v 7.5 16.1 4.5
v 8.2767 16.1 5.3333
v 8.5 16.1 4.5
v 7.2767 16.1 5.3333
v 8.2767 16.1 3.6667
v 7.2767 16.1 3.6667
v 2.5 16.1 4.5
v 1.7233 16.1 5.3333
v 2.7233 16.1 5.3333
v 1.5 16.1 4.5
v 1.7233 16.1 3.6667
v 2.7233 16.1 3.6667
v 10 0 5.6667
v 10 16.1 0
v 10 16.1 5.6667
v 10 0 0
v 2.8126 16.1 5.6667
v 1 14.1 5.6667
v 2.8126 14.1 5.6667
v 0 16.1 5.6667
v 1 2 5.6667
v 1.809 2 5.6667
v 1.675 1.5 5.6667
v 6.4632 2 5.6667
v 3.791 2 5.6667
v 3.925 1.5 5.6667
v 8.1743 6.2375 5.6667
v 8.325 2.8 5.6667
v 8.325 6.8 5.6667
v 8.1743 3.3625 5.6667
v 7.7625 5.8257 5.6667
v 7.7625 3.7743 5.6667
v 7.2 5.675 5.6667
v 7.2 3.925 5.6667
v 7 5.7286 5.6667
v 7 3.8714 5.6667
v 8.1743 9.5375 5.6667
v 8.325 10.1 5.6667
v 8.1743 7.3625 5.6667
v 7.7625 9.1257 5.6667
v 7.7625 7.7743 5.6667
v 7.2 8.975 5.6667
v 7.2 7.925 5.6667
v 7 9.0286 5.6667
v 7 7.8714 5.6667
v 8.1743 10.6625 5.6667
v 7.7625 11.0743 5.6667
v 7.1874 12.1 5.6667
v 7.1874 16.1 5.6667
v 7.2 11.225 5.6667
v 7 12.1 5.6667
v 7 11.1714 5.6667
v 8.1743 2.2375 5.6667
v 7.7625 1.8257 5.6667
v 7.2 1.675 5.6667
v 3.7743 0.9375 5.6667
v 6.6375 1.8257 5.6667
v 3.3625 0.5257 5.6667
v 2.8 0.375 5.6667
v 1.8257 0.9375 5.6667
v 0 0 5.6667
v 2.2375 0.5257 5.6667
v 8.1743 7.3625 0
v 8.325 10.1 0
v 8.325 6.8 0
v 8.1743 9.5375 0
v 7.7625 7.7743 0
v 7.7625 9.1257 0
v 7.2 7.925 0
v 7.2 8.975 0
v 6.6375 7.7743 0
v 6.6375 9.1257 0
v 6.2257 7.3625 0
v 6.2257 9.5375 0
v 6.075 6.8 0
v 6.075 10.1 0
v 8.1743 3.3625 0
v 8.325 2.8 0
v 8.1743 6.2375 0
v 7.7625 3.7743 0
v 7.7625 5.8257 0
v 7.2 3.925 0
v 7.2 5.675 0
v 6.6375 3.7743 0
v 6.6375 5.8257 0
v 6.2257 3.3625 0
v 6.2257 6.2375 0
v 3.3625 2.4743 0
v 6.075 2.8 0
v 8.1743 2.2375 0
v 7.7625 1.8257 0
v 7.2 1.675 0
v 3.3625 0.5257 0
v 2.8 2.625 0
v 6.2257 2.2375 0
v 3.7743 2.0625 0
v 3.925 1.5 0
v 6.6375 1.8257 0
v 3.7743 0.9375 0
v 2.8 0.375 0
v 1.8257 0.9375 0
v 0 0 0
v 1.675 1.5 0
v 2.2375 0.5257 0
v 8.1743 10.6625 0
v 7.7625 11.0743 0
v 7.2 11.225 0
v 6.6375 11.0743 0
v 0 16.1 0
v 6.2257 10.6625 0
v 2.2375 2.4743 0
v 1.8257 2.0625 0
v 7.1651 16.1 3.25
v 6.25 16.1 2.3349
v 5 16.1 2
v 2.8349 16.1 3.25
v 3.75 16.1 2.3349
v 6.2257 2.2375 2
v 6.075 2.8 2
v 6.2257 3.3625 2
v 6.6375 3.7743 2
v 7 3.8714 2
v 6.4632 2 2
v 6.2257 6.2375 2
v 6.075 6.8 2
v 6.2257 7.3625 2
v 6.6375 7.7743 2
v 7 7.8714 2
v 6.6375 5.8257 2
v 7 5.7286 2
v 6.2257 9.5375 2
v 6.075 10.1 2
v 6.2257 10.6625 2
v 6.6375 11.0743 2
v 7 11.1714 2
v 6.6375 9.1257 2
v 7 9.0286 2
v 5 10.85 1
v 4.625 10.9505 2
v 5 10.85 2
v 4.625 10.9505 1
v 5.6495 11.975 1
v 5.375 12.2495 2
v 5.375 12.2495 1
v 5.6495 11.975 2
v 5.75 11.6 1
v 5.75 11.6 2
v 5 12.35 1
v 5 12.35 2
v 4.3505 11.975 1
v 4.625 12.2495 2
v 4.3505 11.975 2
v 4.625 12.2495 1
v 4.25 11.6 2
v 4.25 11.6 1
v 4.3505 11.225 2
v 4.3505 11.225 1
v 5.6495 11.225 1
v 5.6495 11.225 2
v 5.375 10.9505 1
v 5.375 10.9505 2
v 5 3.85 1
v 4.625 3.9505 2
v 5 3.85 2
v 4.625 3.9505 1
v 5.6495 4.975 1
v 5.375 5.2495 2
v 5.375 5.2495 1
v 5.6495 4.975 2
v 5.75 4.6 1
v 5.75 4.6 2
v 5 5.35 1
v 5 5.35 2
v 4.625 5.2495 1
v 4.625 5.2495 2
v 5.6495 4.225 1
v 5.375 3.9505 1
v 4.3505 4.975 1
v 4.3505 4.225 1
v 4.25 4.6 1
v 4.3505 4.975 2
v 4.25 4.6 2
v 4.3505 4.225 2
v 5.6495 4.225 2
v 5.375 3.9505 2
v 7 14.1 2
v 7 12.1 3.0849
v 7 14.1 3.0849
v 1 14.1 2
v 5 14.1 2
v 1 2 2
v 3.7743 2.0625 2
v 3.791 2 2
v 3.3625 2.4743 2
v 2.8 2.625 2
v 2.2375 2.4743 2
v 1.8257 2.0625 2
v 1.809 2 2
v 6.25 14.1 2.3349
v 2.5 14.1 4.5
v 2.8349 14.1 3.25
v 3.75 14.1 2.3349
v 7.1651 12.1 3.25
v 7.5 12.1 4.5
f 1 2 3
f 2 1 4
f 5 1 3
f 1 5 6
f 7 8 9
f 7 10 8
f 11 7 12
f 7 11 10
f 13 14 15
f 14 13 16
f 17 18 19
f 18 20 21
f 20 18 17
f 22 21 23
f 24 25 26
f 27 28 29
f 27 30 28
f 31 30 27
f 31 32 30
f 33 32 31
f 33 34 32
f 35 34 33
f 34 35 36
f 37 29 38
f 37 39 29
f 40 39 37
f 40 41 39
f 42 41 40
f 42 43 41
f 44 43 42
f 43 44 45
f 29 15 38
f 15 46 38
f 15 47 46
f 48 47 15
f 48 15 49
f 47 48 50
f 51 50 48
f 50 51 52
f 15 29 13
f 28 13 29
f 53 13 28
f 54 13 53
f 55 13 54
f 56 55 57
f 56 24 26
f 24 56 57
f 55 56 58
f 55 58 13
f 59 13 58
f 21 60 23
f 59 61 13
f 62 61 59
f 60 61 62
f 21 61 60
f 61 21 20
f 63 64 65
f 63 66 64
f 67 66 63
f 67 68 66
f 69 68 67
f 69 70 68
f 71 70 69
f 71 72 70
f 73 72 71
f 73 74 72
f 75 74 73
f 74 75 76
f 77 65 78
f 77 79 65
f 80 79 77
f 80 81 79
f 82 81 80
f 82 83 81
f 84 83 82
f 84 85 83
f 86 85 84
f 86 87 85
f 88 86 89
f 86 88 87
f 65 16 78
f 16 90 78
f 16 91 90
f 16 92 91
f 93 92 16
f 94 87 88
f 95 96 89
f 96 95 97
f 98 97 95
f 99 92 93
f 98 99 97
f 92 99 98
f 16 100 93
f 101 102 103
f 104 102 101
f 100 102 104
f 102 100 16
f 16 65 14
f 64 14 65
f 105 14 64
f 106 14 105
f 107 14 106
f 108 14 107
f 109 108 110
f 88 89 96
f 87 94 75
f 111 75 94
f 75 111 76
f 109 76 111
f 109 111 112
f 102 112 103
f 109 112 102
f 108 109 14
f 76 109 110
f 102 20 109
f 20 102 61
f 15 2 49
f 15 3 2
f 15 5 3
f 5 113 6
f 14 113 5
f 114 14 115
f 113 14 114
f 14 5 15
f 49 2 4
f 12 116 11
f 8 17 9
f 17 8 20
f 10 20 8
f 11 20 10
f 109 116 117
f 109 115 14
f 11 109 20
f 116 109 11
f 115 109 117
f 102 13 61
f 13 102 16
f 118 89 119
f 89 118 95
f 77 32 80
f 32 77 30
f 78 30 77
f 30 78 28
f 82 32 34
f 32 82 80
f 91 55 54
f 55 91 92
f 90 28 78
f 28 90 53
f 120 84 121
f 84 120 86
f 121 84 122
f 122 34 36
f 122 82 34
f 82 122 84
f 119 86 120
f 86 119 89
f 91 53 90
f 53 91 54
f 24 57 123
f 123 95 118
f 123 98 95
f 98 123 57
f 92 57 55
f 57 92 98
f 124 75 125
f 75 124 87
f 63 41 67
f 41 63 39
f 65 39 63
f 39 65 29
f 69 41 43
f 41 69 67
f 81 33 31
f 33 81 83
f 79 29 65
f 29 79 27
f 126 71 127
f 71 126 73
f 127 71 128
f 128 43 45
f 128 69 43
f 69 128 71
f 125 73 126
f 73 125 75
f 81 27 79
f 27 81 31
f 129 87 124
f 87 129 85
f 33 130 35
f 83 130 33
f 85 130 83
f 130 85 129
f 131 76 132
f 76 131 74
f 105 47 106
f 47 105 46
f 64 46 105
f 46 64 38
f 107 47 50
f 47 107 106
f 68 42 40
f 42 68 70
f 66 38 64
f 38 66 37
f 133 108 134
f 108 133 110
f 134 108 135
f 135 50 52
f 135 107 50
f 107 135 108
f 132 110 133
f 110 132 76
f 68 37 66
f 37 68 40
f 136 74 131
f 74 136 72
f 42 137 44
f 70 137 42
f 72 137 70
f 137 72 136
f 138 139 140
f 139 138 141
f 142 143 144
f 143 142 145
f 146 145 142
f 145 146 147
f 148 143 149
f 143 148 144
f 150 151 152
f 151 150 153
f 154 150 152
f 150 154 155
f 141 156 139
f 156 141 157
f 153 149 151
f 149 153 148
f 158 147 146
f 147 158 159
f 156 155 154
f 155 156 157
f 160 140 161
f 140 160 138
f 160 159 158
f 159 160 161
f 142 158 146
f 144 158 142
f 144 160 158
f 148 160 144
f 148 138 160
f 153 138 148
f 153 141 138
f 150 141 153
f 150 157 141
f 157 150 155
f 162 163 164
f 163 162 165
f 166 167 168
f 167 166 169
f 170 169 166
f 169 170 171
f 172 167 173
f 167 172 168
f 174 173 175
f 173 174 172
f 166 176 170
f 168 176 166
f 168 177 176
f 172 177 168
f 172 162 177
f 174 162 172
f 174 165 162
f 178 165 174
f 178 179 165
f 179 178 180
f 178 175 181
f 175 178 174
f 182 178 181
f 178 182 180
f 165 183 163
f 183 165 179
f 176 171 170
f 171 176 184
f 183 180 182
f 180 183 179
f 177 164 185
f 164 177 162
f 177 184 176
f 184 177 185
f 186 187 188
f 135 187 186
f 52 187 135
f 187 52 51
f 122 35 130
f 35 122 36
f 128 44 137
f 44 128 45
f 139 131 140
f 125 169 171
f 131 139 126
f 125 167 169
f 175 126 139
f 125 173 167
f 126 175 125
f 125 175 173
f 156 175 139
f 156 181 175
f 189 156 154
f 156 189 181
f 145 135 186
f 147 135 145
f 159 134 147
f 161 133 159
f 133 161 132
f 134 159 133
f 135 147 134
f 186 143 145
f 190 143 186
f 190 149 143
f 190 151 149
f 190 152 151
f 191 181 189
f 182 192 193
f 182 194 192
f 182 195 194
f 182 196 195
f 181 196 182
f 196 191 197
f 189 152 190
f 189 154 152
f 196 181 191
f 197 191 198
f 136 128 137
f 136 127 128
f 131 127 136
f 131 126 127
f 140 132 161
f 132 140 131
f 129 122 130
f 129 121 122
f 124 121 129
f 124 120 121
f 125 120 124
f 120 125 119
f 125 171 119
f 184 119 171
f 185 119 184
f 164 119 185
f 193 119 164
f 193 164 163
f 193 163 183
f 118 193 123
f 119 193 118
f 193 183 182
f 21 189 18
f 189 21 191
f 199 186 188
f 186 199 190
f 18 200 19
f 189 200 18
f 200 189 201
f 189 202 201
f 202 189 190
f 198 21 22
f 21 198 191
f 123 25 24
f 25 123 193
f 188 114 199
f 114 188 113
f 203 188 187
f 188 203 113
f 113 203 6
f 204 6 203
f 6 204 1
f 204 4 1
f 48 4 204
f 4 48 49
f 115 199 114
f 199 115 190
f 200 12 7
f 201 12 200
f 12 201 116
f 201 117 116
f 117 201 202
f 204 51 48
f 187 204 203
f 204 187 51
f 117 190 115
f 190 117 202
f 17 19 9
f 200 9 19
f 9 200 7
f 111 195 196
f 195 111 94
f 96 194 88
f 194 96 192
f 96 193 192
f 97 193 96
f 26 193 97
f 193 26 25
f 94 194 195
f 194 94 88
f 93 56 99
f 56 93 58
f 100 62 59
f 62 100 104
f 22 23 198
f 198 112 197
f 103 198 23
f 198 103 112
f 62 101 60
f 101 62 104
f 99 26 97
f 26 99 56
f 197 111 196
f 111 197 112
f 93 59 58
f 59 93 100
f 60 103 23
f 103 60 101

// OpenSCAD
// file: settings.scad
/*
    This file contains the standard options for the pj320a socket.
*/
$fn=12;
pj320a_width = 6;
pj320a_length = 12.1;
pj320a_height = 5;
pj320a_socket_width = pj320a_width + 4;
pj320a_socket_length = pj320a_length + 4;
pj320a_socket_height = pj320a_height + 4;
pj320a_flange_length = 3;
pj320a_flange_diameter = 5;
pj320a_pin_spacing = 4.4;
pj320a_nub_diameter = 1.5;  // Little locating nubs on the bottom of the socket
pj320a_nub_height = 1;
pj320a_nub_spacing = 7;
pj320a_nub_offset = 1.5;  // Distance from the front of the socket (not including flange)
pj320a_plug_width = 10;  // Width of a plug for plate clearance
// main file
include <settings.scad>

module wire_channel(length = 4, wire_diameter = 2.15) {
    translate([0,0,-1]) cylinder(d=wire_diameter+.1,h=length+2);
}

/* 
    This module previews the part by combining the pcb and pcb cutout parts.
    It also highlights the added case and case cutout parts, so those are visible.
*/
module pj320a(pcb_thickness = 4, wire_diameter = 2.15){
    difference() {
        pj320a_pcb(pcb_thickness, wire_diameter);
        #pj320a_pcb_cutout(pcb_thickness, wire_diameter);
    }
    *%difference(){
        pj320a_case();
        #pj320a_case_cutout();
    }
}

module pj320a_pcb(pcb_thickness, wire_diameter) {
    union() {
        cube([pj320a_socket_width,pj320a_socket_length,pj320a_socket_height-pj320a_flange_diameter*2/3]);
        translate([
            pj320a_socket_width/2,
            pj320a_socket_length-pj320a_flange_length,
            pcb_thickness-2+pj320a_flange_diameter/2
        ]) rotate([-90,0,0]) intersection() {
            cylinder(d=pj320a_flange_diameter+2,pj320a_flange_length);
            translate([0,0,pj320a_flange_length/2]) 
                cube([pj320a_flange_diameter+2,pj320a_flange_diameter/3,pj320a_flange_length],center=true);
        }
    }
}

module pj320a_pcb_cutout(pcb_thickness, wire_diameter) {
    translate([4-pj320a_flange_length,2,2]) 
        cube([pj320a_width,pj320a_length,pj320a_height]);
    // Flange Cutout
    translate([
        pj320a_socket_width/2,
        pj320a_socket_length-1-pj320a_flange_length,
        pj320a_flange_diameter-0.5
    ]) rotate([-90,0,0]) 
        cylinder(d=pj320a_flange_diameter,h=pj320a_flange_length+2);
    
    // Wire Channels
    translate([(pj320a_width-pj320a_pin_spacing)/2+2,4-pj320a_flange_length+0.5,0]) 
        wire_channel(pcb_thickness+pj320a_height-3);
    for (y=[1.8,5.8,9.1]) {
        translate([(pj320a_width+pj320a_pin_spacing)/2+2,4-pj320a_flange_length+y,0]) 
            wire_channel(pcb_thickness+pj320a_height-3);
    }
    
    // Locating Pins
    for (y=[pj320a_length-pj320a_nub_offset,pj320a_length-pj320a_nub_offset-pj320a_nub_spacing]) {
        translate([pj320a_socket_width/2,4-pj320a_flange_length+y,pj320a_nub_height])
            cylinder(d=pj320a_nub_diameter,h=4);
    }
}

module pj320a_case(pcb_thickness, wire_diameter) {
    //Unused
}

module pj320a_case_cutout(pcb_thickness, wire_diameter) {
    translate([
        pj320a_socket_width/2 ,
        pj320a_socket_length,
        pj320a_socket_height/2-2
    ]) rotate([-90,0,0]) {
        cylinder(h=1000, d=pj320a_plug_width);
        translate([-pj320a_plug_width/2,-pj320a_plug_width,0])
            cube([pj320a_plug_width, pj320a_plug_width, 1000]);
    }
}

pj320a();
